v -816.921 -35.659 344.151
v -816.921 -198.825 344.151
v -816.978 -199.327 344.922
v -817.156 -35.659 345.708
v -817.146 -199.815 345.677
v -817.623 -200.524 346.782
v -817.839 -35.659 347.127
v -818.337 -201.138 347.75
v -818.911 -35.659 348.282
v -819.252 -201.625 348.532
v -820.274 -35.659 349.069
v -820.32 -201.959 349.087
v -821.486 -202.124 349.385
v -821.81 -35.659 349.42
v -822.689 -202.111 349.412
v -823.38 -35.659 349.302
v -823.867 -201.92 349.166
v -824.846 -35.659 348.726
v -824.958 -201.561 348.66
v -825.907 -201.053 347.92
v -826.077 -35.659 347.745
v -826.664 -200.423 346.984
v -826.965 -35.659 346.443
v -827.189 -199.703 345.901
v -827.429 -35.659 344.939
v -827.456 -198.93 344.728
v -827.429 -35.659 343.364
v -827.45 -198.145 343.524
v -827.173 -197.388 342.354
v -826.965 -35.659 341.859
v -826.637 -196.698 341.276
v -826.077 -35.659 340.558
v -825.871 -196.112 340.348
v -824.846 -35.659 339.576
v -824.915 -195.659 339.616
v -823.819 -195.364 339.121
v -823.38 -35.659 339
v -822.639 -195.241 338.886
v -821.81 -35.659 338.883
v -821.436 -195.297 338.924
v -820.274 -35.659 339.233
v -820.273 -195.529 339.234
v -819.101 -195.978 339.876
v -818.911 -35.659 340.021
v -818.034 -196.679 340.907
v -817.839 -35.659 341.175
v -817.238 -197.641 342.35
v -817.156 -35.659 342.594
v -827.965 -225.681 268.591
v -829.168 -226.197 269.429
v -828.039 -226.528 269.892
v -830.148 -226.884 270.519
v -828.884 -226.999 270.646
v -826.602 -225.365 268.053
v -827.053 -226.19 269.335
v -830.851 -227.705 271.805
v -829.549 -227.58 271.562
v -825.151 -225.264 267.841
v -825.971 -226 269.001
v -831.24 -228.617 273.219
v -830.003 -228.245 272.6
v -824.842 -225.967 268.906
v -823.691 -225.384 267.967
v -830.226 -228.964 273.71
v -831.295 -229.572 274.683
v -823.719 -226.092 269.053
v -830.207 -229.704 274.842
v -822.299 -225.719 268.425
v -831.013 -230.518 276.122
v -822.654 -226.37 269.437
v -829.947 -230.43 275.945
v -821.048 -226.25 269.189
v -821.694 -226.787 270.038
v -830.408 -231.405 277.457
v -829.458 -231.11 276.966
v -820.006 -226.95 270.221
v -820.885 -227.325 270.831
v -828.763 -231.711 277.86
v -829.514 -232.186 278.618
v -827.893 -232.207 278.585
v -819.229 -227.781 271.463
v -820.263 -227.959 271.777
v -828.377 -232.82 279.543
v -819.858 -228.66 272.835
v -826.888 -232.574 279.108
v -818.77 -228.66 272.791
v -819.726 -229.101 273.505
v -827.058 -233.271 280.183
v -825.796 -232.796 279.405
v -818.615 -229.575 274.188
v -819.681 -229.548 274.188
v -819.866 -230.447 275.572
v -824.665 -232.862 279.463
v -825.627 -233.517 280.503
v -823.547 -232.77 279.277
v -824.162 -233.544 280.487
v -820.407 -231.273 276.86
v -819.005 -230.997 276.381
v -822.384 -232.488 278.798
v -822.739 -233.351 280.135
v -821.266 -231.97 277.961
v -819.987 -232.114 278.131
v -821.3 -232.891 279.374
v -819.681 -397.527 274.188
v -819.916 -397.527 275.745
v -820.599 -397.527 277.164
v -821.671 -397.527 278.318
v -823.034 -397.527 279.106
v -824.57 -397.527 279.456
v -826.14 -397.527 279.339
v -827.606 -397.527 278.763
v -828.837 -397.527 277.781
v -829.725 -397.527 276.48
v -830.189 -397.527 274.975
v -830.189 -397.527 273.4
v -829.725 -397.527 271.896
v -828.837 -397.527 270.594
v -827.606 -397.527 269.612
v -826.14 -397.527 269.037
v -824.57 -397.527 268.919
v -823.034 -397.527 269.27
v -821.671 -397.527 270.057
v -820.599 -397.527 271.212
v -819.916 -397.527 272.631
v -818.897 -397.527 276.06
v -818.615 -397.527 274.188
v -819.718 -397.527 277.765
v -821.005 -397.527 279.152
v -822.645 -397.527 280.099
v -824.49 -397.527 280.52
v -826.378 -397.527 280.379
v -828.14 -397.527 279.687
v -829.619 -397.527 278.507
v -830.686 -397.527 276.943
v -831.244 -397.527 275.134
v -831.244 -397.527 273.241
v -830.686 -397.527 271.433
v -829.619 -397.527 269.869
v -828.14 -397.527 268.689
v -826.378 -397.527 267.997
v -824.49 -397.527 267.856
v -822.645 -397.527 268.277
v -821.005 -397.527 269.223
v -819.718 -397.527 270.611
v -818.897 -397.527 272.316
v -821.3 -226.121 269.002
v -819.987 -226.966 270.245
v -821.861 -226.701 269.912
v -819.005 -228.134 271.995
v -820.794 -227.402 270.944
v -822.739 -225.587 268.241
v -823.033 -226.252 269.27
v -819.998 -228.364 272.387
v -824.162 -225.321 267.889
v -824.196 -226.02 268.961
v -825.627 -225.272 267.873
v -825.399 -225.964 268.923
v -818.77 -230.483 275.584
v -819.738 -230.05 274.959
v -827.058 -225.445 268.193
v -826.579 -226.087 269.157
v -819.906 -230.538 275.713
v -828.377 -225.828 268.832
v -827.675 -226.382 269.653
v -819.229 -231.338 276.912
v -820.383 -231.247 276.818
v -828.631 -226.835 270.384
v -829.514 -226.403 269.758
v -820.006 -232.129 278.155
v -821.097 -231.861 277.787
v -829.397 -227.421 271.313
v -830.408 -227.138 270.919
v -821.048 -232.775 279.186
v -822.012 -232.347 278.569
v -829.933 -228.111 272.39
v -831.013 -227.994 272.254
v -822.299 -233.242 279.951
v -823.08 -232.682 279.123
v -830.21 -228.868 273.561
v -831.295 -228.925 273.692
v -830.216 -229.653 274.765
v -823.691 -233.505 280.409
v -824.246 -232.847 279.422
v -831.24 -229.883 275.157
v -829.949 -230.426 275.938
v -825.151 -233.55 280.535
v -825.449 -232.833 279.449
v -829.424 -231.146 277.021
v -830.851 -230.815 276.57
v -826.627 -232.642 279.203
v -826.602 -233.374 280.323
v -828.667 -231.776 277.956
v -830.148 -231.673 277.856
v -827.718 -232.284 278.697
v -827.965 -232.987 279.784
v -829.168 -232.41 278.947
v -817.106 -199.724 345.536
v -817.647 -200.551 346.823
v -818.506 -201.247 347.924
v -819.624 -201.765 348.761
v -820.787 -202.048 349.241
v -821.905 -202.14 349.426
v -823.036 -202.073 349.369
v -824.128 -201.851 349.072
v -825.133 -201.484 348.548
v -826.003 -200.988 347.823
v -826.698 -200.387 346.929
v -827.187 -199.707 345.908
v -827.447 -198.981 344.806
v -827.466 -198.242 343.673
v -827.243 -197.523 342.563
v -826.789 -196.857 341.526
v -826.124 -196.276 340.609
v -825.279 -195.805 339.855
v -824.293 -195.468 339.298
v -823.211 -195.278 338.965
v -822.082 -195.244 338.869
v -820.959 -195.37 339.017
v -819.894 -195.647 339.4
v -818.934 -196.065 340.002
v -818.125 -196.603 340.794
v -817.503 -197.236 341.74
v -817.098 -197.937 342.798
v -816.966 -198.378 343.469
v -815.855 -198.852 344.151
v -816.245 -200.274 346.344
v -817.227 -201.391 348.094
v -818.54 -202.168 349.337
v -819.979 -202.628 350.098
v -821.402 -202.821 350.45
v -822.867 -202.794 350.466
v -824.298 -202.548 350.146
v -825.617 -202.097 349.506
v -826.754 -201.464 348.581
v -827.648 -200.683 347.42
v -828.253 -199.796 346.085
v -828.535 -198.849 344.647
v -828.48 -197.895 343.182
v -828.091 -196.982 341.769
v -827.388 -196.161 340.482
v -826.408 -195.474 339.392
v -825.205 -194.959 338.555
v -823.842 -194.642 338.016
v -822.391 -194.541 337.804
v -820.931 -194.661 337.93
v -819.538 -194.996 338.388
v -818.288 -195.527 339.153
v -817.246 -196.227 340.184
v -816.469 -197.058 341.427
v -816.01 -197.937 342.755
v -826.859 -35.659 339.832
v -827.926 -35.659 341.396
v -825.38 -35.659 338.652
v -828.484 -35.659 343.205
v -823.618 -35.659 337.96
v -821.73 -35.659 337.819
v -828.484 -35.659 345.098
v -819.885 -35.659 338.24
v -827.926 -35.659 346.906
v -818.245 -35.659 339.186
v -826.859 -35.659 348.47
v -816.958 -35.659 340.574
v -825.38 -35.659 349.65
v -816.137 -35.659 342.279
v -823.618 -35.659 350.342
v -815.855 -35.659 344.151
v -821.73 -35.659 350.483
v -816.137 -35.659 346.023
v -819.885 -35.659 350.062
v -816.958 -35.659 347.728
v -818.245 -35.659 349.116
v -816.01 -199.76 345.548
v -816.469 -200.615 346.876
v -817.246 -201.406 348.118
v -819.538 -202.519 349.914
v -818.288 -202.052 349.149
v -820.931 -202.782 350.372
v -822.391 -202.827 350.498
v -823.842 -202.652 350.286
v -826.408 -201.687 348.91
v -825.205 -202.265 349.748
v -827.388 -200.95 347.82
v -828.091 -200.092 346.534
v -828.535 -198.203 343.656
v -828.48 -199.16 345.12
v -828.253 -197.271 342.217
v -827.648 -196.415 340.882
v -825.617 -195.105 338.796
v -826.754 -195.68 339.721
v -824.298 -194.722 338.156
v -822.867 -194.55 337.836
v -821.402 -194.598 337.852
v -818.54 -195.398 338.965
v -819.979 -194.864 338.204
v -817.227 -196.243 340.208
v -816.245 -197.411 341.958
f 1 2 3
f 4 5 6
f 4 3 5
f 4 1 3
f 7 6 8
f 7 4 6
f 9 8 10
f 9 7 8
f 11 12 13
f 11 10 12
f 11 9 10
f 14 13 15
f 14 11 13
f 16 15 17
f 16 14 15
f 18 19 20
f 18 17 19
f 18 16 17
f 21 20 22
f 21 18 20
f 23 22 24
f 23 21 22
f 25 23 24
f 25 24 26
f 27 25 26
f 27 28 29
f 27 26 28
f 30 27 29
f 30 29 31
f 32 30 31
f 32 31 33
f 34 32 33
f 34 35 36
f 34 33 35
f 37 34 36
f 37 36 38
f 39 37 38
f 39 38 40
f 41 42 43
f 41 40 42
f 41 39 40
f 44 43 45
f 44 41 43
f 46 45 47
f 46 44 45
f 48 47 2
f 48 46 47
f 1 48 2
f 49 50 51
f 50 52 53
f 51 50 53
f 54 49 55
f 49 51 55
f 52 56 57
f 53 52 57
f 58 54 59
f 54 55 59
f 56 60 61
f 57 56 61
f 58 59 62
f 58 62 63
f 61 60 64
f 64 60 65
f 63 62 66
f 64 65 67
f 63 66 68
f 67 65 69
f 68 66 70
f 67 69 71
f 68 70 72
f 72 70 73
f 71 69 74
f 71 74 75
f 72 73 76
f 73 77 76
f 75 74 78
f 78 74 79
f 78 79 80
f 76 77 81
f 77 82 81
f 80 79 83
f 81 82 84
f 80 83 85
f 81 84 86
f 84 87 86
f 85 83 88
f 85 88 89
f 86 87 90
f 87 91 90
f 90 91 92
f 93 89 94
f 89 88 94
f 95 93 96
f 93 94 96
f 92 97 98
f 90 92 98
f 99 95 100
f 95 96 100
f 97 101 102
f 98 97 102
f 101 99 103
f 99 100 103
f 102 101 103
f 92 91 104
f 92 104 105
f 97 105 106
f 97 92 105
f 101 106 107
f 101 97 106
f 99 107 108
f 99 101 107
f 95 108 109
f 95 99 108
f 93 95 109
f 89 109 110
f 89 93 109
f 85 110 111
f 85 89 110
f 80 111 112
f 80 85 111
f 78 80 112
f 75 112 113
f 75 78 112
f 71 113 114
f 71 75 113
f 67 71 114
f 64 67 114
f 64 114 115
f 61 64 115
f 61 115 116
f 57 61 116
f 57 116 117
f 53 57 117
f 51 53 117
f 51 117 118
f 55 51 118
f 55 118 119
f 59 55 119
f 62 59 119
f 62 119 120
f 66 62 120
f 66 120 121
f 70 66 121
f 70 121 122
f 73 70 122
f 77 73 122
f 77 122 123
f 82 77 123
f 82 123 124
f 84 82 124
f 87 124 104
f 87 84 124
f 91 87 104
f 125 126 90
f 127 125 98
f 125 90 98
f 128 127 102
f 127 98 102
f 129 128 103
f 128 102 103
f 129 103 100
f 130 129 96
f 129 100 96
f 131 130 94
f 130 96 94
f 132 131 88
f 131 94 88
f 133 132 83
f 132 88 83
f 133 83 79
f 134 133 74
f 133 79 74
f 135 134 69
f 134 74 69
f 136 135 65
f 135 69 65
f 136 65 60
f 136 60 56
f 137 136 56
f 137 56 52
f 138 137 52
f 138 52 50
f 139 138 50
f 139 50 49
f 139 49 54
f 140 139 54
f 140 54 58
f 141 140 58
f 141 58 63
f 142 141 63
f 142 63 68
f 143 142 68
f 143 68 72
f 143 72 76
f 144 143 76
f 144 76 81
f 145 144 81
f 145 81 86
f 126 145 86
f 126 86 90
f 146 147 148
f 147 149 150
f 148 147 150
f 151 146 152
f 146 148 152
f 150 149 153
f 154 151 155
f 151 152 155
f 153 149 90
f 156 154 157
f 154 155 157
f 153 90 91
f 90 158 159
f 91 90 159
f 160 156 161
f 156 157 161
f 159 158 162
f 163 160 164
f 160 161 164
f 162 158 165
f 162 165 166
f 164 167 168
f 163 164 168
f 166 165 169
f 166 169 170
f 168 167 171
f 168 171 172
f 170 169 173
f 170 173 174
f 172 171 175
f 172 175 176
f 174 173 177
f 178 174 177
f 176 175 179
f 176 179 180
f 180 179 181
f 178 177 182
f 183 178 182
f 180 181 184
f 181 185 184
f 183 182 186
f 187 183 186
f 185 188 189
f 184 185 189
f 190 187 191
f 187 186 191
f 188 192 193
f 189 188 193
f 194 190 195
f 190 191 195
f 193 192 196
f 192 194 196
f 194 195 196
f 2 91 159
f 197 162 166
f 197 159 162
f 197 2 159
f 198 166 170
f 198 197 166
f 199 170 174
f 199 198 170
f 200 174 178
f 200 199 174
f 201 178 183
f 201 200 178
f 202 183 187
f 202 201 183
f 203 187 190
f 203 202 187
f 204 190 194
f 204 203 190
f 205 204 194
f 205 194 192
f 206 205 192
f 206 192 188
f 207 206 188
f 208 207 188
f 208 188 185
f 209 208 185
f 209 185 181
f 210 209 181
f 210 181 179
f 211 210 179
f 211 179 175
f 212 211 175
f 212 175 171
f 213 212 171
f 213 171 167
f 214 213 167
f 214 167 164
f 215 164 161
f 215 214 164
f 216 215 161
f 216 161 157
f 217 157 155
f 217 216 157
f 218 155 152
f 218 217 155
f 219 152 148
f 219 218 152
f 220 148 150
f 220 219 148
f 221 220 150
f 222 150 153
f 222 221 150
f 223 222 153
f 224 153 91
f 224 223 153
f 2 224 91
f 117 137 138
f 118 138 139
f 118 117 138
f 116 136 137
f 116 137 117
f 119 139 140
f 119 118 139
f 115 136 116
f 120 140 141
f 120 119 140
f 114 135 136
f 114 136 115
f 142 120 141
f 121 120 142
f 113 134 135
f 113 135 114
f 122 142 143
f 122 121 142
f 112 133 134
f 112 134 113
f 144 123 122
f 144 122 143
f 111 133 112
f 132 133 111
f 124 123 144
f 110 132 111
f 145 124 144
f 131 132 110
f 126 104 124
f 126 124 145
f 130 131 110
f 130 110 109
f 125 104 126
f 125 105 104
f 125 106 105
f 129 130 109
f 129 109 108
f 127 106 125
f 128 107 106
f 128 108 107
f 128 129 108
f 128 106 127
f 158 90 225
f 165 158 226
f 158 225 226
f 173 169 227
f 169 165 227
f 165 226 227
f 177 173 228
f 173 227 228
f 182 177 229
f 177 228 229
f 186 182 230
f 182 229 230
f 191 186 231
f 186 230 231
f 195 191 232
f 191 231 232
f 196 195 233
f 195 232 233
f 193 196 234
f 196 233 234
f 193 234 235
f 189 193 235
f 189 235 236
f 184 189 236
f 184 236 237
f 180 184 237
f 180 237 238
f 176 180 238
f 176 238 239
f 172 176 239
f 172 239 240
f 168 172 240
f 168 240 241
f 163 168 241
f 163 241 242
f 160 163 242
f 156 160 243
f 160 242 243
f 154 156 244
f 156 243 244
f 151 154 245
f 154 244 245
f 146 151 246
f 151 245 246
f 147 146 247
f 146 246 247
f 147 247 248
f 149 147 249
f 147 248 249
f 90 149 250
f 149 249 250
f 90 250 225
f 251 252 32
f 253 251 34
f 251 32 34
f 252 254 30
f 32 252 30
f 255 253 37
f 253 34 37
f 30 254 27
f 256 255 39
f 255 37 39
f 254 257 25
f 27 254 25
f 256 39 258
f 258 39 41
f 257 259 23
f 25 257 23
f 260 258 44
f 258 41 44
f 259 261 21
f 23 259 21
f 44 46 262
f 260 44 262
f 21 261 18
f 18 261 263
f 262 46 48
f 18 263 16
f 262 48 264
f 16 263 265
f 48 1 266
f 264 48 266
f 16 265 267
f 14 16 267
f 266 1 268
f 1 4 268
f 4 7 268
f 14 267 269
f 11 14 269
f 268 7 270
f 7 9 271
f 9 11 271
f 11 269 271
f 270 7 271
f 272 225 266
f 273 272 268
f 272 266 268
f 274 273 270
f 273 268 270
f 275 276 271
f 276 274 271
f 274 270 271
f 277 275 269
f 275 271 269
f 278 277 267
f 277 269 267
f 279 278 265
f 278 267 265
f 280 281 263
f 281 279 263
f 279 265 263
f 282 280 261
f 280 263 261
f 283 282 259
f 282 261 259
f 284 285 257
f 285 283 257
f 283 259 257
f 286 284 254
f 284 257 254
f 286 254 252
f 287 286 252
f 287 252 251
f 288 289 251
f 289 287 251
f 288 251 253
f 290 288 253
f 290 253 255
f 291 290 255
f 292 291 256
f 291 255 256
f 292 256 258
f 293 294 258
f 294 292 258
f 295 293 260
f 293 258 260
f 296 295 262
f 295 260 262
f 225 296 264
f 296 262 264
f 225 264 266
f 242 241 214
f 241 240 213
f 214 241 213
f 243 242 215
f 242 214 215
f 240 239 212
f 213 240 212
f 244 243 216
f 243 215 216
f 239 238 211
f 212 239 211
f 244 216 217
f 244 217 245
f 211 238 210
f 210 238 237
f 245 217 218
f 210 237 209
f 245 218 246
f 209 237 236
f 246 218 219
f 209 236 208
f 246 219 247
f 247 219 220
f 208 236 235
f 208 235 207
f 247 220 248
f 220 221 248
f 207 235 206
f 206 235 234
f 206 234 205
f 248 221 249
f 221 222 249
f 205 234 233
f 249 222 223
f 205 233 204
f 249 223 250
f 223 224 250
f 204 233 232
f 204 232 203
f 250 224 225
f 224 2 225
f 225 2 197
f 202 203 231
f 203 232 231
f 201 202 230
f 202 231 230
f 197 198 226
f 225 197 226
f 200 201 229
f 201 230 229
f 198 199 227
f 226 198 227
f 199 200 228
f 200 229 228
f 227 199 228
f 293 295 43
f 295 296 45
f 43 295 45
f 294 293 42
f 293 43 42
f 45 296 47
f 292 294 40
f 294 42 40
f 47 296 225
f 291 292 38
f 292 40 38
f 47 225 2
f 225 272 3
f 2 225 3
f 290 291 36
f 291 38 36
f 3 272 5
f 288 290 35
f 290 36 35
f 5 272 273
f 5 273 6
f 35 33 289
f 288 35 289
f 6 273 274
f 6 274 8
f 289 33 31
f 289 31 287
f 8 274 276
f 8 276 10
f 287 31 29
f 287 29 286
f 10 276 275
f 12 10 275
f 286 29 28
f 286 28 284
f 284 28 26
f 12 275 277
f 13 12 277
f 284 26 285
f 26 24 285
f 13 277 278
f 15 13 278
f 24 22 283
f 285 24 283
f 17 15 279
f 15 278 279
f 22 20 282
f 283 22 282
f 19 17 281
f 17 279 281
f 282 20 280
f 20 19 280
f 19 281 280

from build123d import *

# Parameters (mm, degrees)
SKETCH1_R                 = 6.35
SKETCH1_R_2               = 5.2832
PIPE_0_5_SCH_40_1_DEPTH   = 169.896432715
SKETCH1_ON_SEGMENT_2_R    = 6.35
SKETCH1_ON_SEGMENT_2_R_2  = 5.2832
PIPE_0_5_SCH_40_1_2_DEPTH = 90.194153874
SKETCH1_ON_SEGMENT_3_R    = 6.35
SKETCH1_ON_SEGMENT_3_R_2  = 5.2832
PIPE_0_5_SCH_40_1_3_DEPTH = 174.981068719


with BuildPart() as part:
    # Sketch1 → Pipe 0.5 SCH 40(1) (new body)
    with BuildSketch(Plane(origin=(-822.204533178, -35.658828401, 344.151093016), x_dir=(1, 0, 0), z_dir=(0, -1, 0))):
        Circle(SKETCH1_R)
        Circle(SKETCH1_R_2, mode=Mode.SUBTRACT)
    extrude(amount=PIPE_0_5_SCH_40_1_DEPTH)

    # Pipe 0.5 SCH 40(1) mitre 1
    split(bisect_by=Plane(origin=(-822.204533178, -198.688949127, 344.151093016), x_dir=(-0.999668627, 0.025741717, 0), z_dir=(0.021558105, 0.837199865, 0.546471989)), keep=Keep.TOP)


with BuildPart() as body_2:
    # Sketch1 on segment 2 (carried to segment 2) → Pipe 0.5 SCH 40_1 2 (new body)
    with BuildSketch(Plane(origin=(-821.956680698, -195.930015343, 350.433854657), x_dir=(0.999070496, -0.036096886, -0.023561801), z_dir=(-0.036096886, -0.401807228, -0.91501255))):
        Circle(SKETCH1_ON_SEGMENT_2_R)
        Circle(SKETCH1_ON_SEGMENT_2_R_2, mode=Mode.SUBTRACT)
    extrude(amount=PIPE_0_5_SCH_40_1_2_DEPTH)

    # Pipe 0.5 SCH 40_1 2 mitre 1
    split(bisect_by=Plane(origin=(-822.204533178, -198.688949127, 344.151093016), x_dir=(0.999668627, -0.025741717, 0), z_dir=(-0.021558105, -0.837199865, -0.546471989)), keep=Keep.TOP)

    # Pipe 0.5 SCH 40_1 2 mitre 2
    split(bisect_by=Plane(origin=(-824.964556297, -229.411744477, 274.187833569), x_dir=(-0.999668627, 0.025741717, 0), z_dir=(0.021558105, 0.837199865, 0.546471989)), keep=Keep.TOP)


with BuildPart() as body_3:
    # Sketch1 on segment 3 (carried to segment 3) → Pipe 0.5 SCH 40_1 3 (new body)
    with BuildSketch(Plane(origin=(-824.964556297, -222.545432488, 274.187833569), x_dir=(1, 0, 0), z_dir=(0, -1, 0))):
        Circle(SKETCH1_ON_SEGMENT_3_R)
        Circle(SKETCH1_ON_SEGMENT_3_R_2, mode=Mode.SUBTRACT)
    extrude(amount=PIPE_0_5_SCH_40_1_3_DEPTH)

    # Pipe 0.5 SCH 40_1 3 mitre 1
    split(bisect_by=Plane(origin=(-824.964556297, -229.411744477, 274.187833569), x_dir=(0.999668627, -0.025741717, 0), z_dir=(-0.021558105, -0.837199865, -0.546471989)), keep=Keep.TOP)


solid = Compound([part.part, body_2.part, body_3.part])
